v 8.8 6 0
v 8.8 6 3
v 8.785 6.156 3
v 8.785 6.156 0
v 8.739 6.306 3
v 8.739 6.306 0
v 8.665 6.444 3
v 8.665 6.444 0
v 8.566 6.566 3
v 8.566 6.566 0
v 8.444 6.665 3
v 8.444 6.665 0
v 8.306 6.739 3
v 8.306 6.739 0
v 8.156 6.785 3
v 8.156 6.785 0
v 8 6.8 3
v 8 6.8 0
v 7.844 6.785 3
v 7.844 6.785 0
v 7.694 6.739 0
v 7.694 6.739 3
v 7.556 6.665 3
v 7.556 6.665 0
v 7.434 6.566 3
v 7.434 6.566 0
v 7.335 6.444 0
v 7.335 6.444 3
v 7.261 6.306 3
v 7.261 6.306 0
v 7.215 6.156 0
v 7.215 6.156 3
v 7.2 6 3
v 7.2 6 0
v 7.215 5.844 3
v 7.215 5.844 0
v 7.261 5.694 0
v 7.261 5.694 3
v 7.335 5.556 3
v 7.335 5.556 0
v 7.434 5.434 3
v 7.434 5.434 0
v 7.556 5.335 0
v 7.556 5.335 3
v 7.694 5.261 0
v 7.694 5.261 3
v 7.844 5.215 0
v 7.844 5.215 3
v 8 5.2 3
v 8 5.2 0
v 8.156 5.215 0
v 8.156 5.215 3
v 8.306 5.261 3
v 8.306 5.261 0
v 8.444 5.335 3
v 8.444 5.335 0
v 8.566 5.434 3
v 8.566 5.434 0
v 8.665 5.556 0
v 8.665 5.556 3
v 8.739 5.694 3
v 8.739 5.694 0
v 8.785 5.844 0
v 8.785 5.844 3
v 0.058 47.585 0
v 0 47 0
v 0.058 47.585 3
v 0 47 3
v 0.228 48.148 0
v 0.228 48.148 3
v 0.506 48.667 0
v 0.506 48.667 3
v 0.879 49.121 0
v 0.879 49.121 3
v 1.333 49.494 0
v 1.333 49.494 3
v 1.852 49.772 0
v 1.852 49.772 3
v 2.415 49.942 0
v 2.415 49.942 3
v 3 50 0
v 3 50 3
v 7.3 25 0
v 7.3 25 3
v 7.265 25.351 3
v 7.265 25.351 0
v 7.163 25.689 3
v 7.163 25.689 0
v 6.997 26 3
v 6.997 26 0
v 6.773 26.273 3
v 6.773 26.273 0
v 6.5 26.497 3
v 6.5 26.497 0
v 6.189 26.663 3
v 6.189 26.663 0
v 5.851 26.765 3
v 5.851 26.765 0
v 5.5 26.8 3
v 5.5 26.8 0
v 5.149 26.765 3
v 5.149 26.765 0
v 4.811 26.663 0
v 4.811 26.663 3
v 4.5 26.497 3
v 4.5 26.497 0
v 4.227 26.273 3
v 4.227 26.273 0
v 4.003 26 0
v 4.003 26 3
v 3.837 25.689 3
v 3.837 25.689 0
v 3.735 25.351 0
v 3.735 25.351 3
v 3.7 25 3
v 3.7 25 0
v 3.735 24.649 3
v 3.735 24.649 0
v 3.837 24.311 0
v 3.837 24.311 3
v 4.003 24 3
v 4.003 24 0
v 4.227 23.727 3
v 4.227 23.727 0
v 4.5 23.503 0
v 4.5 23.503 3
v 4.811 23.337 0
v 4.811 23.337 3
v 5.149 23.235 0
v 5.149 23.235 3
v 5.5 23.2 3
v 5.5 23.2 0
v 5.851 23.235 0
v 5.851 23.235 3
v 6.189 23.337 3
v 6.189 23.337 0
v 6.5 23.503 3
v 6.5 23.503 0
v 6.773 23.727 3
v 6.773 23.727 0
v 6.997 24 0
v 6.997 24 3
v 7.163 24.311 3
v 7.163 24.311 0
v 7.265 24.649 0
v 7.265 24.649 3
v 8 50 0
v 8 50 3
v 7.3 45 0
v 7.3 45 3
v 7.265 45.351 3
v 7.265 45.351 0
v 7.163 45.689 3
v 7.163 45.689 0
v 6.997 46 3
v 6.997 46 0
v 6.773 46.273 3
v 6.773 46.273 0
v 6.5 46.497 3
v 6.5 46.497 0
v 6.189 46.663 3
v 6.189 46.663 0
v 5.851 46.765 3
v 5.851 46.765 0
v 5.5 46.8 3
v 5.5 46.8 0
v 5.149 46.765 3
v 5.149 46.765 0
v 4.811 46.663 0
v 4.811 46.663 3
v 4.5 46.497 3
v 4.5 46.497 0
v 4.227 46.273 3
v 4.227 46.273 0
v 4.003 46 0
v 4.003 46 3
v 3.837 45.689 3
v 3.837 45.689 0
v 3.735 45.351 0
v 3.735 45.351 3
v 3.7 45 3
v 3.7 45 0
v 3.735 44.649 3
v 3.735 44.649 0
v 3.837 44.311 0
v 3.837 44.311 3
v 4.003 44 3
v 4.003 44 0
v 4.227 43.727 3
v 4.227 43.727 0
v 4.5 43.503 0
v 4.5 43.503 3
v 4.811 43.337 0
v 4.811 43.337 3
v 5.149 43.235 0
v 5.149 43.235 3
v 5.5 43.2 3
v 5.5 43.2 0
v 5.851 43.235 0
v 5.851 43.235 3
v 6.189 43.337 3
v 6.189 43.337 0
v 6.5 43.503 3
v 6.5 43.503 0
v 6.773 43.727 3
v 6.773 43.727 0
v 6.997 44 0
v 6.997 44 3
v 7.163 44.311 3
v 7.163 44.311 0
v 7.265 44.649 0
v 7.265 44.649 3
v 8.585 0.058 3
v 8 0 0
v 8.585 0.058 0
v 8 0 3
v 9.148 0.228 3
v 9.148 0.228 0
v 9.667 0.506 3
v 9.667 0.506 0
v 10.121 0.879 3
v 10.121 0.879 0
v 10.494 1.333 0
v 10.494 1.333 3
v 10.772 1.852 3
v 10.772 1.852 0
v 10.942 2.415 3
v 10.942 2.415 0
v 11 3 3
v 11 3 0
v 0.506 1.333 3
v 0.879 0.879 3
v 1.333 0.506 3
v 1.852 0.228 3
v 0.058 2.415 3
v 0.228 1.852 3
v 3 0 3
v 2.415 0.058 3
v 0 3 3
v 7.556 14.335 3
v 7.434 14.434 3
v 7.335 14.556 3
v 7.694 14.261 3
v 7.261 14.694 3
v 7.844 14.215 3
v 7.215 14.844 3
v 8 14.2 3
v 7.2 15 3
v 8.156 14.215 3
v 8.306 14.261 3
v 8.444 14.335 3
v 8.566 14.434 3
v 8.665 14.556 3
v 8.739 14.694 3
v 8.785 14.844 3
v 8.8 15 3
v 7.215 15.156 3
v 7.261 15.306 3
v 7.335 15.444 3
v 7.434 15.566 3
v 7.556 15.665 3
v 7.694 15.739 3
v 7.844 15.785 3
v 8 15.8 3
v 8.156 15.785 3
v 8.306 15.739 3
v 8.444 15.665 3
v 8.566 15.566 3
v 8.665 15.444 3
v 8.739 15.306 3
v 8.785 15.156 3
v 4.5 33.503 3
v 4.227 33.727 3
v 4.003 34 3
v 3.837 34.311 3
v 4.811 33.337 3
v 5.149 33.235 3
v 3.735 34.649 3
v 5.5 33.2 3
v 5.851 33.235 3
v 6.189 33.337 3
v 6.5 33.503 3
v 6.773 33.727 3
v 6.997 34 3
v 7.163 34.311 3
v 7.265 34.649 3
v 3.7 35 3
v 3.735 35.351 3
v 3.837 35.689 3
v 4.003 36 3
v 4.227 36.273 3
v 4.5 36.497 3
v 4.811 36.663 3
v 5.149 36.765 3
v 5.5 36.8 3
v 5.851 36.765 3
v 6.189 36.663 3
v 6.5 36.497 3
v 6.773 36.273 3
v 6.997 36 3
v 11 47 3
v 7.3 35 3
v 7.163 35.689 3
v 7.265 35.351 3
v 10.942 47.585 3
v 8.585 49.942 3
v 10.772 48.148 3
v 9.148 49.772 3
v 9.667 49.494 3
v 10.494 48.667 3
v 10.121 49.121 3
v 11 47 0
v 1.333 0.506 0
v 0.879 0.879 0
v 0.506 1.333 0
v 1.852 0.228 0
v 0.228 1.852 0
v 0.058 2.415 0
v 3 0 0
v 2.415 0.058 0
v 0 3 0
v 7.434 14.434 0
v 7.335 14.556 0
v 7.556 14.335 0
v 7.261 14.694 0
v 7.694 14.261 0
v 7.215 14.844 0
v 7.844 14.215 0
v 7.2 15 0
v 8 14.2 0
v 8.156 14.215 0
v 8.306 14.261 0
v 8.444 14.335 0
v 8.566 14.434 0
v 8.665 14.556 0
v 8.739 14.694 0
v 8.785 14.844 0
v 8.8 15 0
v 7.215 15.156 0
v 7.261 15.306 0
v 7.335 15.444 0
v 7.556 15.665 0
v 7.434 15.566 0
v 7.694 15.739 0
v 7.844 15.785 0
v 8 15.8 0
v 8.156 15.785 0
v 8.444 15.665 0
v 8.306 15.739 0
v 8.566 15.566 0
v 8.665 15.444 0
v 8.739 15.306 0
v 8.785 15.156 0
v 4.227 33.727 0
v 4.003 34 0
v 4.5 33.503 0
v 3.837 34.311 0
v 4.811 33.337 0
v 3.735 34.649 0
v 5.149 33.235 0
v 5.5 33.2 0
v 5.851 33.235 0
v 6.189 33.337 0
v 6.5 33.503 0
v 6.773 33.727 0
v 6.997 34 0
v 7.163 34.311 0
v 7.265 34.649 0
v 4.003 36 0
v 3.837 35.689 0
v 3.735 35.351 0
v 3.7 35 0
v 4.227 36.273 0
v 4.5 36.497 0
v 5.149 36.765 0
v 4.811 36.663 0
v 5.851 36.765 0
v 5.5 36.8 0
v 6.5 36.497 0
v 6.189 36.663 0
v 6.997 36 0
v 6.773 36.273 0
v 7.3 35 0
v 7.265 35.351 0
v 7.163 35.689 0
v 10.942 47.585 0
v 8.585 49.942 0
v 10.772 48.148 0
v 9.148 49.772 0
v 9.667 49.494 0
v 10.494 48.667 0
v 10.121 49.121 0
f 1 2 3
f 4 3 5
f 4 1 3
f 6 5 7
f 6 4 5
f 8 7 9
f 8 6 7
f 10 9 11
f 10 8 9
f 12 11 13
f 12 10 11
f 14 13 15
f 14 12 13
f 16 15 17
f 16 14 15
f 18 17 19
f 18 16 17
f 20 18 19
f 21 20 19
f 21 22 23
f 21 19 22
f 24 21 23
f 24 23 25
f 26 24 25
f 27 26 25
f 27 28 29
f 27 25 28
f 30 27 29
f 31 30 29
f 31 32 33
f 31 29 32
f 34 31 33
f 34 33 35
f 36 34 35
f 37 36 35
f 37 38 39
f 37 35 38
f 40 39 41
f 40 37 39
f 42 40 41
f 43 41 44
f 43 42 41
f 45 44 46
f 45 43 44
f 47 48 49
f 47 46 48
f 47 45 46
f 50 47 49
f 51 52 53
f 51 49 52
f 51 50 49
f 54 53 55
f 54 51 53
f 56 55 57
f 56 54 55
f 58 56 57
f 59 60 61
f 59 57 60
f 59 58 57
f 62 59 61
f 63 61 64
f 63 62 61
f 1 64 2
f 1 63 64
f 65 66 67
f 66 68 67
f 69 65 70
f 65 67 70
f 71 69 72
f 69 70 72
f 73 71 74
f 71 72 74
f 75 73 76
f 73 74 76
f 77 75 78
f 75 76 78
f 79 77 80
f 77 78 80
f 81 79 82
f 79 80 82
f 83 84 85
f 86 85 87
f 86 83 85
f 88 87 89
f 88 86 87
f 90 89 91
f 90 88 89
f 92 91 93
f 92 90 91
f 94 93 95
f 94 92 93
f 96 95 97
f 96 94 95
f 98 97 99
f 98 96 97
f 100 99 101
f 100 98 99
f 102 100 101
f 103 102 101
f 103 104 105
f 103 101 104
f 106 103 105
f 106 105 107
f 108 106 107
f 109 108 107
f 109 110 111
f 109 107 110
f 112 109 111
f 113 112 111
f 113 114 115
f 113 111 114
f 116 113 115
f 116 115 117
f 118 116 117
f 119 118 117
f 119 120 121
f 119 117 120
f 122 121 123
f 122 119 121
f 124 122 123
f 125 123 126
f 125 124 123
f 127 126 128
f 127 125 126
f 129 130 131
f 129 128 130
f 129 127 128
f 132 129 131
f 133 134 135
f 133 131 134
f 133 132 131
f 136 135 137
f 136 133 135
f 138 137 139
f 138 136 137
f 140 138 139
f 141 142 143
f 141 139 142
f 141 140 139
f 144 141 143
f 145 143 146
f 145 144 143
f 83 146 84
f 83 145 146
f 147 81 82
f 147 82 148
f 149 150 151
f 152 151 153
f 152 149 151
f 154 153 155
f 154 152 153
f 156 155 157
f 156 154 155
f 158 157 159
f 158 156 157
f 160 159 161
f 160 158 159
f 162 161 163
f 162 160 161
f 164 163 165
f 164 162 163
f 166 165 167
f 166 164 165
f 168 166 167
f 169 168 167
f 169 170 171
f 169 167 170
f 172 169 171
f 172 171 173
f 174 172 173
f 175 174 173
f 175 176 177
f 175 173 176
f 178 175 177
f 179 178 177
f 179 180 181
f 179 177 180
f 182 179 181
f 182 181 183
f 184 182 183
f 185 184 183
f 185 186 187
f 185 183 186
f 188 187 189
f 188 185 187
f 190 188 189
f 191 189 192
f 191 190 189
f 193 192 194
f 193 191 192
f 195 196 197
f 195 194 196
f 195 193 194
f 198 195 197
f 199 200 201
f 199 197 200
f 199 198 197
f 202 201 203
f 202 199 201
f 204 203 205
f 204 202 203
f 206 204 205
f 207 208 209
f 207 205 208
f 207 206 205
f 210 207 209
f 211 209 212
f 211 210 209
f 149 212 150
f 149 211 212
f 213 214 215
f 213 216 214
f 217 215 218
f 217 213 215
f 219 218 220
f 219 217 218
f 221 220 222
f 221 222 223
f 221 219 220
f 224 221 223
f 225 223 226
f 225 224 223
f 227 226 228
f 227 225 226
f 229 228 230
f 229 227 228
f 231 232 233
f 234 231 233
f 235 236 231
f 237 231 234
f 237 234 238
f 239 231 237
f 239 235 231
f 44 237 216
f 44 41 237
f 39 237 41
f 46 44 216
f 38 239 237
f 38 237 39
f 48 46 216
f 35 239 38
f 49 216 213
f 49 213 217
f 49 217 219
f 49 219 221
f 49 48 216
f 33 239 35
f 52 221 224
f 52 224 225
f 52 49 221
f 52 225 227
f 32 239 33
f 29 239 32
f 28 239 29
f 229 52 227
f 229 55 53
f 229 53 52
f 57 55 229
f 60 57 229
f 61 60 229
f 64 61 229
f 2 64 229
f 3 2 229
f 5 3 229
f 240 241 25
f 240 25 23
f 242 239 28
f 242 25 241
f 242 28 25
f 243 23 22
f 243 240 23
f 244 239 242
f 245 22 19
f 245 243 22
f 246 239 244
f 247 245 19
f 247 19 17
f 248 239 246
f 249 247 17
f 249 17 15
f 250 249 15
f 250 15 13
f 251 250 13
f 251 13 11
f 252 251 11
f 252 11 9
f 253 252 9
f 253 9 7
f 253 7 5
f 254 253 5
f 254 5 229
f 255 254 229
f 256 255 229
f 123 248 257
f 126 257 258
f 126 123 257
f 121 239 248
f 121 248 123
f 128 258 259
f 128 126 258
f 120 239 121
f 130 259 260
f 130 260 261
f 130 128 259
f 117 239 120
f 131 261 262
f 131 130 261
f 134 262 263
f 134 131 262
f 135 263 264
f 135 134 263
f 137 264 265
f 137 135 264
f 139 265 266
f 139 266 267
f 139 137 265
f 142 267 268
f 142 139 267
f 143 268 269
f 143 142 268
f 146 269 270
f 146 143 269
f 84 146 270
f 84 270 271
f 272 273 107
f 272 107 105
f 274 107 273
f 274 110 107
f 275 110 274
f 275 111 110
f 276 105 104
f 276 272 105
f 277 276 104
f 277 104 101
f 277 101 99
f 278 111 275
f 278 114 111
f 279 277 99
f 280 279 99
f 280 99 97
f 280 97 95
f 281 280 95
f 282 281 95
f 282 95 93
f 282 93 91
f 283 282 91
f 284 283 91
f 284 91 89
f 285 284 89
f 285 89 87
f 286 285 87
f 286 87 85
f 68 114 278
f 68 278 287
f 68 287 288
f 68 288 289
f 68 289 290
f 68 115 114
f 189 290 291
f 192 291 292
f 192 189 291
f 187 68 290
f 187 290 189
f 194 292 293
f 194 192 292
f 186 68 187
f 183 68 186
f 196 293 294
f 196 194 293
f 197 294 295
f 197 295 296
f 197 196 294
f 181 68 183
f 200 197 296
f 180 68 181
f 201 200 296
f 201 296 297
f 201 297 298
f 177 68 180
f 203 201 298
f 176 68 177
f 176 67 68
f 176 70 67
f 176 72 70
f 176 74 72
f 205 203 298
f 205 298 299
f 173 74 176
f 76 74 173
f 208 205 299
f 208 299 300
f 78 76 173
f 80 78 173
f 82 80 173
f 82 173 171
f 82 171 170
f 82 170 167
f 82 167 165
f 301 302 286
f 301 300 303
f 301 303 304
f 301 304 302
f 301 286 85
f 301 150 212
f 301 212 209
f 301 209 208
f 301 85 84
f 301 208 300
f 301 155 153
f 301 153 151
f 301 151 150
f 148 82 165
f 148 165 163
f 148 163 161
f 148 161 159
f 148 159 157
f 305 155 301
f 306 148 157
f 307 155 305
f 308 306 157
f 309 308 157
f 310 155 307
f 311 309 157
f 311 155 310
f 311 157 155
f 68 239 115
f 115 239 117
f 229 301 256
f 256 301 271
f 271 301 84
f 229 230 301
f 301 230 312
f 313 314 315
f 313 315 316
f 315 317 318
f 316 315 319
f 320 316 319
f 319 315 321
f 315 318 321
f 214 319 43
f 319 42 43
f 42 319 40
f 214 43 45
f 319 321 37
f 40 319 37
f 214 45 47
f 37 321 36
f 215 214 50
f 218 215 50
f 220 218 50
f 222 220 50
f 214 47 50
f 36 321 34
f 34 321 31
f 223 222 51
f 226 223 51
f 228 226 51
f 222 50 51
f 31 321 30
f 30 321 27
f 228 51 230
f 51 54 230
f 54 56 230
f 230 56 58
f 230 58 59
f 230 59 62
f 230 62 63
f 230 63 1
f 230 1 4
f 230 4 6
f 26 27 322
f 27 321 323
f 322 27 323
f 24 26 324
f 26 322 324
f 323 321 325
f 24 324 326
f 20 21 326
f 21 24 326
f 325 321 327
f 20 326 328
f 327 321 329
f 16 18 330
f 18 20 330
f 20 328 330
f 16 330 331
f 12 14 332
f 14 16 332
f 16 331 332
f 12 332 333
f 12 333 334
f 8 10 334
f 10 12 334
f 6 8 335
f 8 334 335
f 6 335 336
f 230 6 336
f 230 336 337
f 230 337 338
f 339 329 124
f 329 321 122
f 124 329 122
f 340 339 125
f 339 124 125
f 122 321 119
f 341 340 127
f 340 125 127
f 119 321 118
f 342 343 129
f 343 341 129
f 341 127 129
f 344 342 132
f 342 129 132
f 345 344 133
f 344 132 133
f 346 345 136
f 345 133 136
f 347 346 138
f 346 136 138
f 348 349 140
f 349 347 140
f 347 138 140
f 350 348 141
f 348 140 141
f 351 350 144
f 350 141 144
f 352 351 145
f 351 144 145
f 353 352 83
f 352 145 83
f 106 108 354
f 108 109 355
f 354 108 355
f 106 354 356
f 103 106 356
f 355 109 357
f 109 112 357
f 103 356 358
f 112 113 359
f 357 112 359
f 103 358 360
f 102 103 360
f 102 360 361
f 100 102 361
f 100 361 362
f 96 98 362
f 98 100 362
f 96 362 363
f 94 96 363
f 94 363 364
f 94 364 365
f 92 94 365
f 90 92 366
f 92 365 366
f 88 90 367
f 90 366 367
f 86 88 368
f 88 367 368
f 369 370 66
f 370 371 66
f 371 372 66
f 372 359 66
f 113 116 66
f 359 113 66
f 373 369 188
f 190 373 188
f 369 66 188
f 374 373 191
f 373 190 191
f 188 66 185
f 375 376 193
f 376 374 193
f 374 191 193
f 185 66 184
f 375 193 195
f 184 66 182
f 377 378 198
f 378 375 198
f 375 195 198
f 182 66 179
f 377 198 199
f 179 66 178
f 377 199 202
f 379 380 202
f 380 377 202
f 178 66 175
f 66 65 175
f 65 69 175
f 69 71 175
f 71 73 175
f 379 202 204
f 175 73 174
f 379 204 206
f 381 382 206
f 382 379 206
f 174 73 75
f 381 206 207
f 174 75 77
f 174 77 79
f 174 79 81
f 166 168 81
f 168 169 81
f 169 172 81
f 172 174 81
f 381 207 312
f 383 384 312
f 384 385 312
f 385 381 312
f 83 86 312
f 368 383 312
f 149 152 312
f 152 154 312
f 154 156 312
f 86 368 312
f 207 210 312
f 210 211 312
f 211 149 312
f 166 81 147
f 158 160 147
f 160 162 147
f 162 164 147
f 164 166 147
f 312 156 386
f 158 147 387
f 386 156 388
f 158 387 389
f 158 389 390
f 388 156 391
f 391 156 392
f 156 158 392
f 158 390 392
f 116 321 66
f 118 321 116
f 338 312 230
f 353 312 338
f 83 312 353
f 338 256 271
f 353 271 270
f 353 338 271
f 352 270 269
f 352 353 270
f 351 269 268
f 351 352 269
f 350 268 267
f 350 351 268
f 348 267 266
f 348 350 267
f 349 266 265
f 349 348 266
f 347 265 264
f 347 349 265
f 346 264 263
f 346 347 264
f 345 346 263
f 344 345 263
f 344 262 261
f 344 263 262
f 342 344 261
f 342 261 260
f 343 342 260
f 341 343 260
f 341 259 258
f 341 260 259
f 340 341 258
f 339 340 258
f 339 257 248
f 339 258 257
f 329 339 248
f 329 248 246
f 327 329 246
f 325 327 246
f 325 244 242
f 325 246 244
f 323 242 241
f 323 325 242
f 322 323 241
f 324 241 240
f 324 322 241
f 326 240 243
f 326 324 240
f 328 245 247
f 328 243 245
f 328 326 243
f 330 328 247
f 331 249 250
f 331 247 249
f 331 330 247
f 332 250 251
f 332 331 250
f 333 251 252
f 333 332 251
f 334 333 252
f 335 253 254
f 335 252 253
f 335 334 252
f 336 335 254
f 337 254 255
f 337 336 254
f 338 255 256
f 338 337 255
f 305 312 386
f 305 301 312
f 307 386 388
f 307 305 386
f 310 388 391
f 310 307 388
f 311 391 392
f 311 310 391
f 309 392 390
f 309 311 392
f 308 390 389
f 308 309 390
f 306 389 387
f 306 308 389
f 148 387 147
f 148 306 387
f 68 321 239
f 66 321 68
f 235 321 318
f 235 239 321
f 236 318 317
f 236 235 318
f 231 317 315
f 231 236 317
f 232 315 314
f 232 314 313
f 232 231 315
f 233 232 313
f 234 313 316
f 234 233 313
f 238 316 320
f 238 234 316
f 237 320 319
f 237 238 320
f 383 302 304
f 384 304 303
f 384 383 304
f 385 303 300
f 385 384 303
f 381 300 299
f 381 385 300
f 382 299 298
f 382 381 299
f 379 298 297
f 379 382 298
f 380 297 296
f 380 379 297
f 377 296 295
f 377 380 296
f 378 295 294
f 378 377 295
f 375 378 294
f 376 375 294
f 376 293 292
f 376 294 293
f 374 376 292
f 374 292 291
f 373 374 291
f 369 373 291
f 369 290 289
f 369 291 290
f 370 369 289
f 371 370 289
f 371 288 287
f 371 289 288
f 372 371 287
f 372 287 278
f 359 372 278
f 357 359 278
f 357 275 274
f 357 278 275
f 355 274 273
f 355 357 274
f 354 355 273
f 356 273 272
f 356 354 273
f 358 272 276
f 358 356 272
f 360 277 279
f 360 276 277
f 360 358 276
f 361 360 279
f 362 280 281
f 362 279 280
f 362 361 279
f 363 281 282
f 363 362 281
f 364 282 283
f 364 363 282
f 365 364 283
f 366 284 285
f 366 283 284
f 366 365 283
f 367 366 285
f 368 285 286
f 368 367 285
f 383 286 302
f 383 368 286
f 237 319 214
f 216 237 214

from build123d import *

# Parameters (mm, degrees)
CYLINDER115_R       = 1.8
CYLINDER115_DEPTH   = 10
ARRAY001018_Y_COUNT = 3
ARRAY001018_Y_PITCH = 10
CYLINDER034_R       = 0.8
CYLINDER034_DEPTH   = 30
ARRAY001017_Y_COUNT = 2
ARRAY001017_Y_PITCH = 9
BOX013_W            = 11
BOX013_H            = 50
BOX013_DEPTH        = 3
FILLET006_R         = 3


with BuildPart() as bolt_hole_array:
    # Cylinder115 → Cylinder115 (new body)
    with BuildSketch(Plane.XY):
        Circle(CYLINDER115_R)
    extrude(amount=CYLINDER115_DEPTH)

    # Array001018 Y: bolt hole array ×3


with BuildPart() as bolt_hole_array_1:
    add(bolt_hole_array.part)
    with Locations(*[(0, i * ARRAY001018_Y_PITCH, 0) for i in range(1, ARRAY001018_Y_COUNT)]):
        add(bolt_hole_array.part)


with BuildPart() as bolt_hole_array_2:
    # Array001018 placement: moved
    add(bolt_hole_array_1.part.moved(Location((5.5, 25, 0))))


with BuildPart() as endstop_hole_fusion:
    # Cylinder034 → Cylinder034 (new body)
    with BuildSketch(Plane.XY):
        Circle(CYLINDER034_R)
    extrude(amount=CYLINDER034_DEPTH)

    # Array001017 Y: endstop hole fusion ×2


with BuildPart() as endstop_hole_fusion_1:
    add(endstop_hole_fusion.part)
    with Locations(*[(0, i * ARRAY001017_Y_PITCH, 0) for i in range(1, ARRAY001017_Y_COUNT)]):
        add(endstop_hole_fusion.part)


with BuildPart() as endstop_hole_fusion_2:
    # Array001017 placement: moved
    add(endstop_hole_fusion_1.part.moved(Location((8, 6, 0))))

    # Fusion015: union bolt hole array
    add(bolt_hole_array_2.part)


with BuildPart() as endstop_base_cut:
    # Box013 → Box013 (new body)
    with BuildSketch(Plane.XY):
        with Locations((5.5, 25)):
            Rectangle(BOX013_W, BOX013_H)
    extrude(amount=BOX013_DEPTH)

    # Fillet006
    fillet006_edges = [endstop_base_cut.edges().sort_by_distance(p)[0] for p in [
        (0, 0, 1.5),
        (0, 50, 1.5),
        (11, 0, 1.5),
        (11, 50, 1.5),
    ]]
    fillet(fillet006_edges, radius=FILLET006_R)

    # Cut010: cut endstop hole fusion
    add(endstop_hole_fusion_2.part, mode=Mode.SUBTRACT)


solid = endstop_base_cut.part
